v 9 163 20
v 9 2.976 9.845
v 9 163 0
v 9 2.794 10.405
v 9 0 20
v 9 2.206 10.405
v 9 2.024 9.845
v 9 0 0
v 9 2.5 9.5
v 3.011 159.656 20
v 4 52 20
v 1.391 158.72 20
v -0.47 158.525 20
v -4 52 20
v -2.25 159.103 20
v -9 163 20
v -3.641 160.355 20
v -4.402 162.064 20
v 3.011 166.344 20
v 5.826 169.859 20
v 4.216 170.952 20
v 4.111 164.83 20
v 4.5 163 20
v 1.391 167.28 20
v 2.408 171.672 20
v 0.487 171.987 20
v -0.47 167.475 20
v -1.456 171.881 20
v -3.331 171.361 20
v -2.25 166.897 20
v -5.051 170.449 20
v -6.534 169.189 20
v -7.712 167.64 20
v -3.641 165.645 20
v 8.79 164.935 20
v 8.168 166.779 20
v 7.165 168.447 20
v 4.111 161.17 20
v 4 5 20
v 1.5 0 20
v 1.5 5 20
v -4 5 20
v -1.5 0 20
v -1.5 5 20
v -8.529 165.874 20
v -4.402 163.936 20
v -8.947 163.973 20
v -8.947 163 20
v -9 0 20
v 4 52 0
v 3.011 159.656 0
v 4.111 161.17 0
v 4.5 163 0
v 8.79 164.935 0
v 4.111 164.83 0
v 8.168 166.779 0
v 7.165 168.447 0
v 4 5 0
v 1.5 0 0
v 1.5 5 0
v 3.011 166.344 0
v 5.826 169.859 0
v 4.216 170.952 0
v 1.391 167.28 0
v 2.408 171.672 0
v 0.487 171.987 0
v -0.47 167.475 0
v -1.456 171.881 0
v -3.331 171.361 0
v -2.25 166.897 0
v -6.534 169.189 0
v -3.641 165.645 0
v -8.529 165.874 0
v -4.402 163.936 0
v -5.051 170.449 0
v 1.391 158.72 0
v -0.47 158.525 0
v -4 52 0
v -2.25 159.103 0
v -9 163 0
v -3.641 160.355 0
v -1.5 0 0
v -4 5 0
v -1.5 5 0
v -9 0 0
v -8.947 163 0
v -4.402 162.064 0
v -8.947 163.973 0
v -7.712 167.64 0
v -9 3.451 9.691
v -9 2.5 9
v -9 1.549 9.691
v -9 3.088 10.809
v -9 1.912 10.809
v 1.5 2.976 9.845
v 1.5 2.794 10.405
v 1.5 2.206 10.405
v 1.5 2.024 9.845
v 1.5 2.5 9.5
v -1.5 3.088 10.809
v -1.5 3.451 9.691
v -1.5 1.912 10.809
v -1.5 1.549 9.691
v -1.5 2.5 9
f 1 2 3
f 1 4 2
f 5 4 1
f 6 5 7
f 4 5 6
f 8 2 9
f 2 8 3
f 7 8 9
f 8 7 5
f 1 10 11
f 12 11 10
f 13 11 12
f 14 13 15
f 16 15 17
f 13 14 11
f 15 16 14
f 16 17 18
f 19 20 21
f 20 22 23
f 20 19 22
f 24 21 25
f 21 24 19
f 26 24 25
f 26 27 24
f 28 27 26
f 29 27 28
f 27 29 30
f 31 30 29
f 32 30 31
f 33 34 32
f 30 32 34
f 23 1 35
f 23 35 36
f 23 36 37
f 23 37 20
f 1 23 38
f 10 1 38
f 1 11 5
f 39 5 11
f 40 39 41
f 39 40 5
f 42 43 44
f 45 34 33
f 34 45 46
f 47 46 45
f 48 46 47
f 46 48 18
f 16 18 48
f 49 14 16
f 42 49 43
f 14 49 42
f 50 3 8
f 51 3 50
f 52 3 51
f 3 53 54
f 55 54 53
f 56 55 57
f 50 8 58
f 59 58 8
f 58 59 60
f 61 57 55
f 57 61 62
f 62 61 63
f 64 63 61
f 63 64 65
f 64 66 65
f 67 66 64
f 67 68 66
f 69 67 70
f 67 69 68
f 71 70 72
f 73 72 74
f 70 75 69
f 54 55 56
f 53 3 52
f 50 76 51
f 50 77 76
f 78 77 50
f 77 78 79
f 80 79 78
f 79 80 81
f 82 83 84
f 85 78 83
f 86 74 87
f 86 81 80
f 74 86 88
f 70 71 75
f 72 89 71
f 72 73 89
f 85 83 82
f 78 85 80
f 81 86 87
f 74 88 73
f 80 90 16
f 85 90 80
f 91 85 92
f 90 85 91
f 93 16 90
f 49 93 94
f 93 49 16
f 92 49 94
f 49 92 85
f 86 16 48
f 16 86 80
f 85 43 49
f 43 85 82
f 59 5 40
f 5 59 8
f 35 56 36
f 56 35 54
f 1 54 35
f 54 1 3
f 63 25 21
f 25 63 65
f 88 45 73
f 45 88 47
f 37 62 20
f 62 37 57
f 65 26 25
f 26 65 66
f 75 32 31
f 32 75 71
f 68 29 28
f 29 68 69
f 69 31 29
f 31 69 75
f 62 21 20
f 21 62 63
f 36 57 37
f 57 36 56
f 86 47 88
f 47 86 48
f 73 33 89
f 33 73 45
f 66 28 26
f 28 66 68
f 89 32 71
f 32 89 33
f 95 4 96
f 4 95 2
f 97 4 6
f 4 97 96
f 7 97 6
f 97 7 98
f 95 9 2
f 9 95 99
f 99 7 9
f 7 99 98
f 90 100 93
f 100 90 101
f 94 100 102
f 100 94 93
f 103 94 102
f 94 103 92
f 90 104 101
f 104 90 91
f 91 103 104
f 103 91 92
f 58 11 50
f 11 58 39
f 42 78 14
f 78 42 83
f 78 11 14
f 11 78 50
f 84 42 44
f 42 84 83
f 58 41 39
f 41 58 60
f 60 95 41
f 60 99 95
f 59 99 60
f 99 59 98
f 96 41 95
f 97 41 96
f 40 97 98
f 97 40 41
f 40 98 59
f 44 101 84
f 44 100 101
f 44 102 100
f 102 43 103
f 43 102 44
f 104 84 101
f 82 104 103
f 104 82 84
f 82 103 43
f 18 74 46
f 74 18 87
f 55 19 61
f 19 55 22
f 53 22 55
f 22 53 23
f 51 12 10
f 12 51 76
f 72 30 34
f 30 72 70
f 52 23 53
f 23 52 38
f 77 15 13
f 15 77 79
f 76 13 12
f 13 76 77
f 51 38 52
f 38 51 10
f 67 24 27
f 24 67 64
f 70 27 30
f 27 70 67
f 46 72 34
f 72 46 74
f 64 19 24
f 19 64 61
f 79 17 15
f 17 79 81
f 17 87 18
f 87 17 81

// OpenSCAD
Height = 120;           //How tall should it be?
Width = 20;             //How wide should it be (when looking at it mounted on the frame)?
Hole_Diamater = 9;      //How wide should the hole be?
Frame_Thickness = 8;    //How thick is the printer frame?
Frame_Height = 47;     //Giw tall is the printer frame?
Fram_Wall_Thickness = 5;  //  How thick should the part be around the frame?

Thickness = Fram_Wall_Thickness+Frame_Thickness+Fram_Wall_Thickness;
Screw_Clearance = 5;
Screw_Gap = 3;
Screw_Diamater = 1;
Primary_Height = Height-(Thickness/2)+Frame_Height+Screw_Clearance;



difference(){
    //  The primary frame with a cylinder at the top to round it off
    union(){
        translate([Thickness/2*(-1),0,0])cube([Thickness,Primary_Height,Width]);
        translate([0,Primary_Height,0])cylinder(d=Thickness,h=Width);
    }
    //  Remove the main slot for the frame
    translate([Frame_Thickness/2*(-1),Screw_Clearance,-1])cube([Frame_Thickness,Frame_Height,Width+2]);
    //  Remove the small gap at bottom for the screw mounts.
    translate([Screw_Gap/2*(-1),-1,-1])cube([Screw_Gap,Screw_Clearance+2,Width+2]);
    //  Remove the hole at the top the threaded rod goes through
    translate([0,Primary_Height,-1])cylinder(d=Hole_Diamater,h=Width+2);
    //  Remove the screw hole
    if(Width > 2 ) {
        rotate([0,90,0])translate([Width/2*(-1),Screw_Clearance/2,Thickness/2*(-1)-1])cylinder(d=Screw_Diamater, h=Thickness+2);
        rotate([0,90,0])translate([Width/2*(-1),Screw_Clearance/2,Thickness/2*(-1)-1])cylinder(d=Screw_Diamater+1, h=Thickness/2);
    }
}
